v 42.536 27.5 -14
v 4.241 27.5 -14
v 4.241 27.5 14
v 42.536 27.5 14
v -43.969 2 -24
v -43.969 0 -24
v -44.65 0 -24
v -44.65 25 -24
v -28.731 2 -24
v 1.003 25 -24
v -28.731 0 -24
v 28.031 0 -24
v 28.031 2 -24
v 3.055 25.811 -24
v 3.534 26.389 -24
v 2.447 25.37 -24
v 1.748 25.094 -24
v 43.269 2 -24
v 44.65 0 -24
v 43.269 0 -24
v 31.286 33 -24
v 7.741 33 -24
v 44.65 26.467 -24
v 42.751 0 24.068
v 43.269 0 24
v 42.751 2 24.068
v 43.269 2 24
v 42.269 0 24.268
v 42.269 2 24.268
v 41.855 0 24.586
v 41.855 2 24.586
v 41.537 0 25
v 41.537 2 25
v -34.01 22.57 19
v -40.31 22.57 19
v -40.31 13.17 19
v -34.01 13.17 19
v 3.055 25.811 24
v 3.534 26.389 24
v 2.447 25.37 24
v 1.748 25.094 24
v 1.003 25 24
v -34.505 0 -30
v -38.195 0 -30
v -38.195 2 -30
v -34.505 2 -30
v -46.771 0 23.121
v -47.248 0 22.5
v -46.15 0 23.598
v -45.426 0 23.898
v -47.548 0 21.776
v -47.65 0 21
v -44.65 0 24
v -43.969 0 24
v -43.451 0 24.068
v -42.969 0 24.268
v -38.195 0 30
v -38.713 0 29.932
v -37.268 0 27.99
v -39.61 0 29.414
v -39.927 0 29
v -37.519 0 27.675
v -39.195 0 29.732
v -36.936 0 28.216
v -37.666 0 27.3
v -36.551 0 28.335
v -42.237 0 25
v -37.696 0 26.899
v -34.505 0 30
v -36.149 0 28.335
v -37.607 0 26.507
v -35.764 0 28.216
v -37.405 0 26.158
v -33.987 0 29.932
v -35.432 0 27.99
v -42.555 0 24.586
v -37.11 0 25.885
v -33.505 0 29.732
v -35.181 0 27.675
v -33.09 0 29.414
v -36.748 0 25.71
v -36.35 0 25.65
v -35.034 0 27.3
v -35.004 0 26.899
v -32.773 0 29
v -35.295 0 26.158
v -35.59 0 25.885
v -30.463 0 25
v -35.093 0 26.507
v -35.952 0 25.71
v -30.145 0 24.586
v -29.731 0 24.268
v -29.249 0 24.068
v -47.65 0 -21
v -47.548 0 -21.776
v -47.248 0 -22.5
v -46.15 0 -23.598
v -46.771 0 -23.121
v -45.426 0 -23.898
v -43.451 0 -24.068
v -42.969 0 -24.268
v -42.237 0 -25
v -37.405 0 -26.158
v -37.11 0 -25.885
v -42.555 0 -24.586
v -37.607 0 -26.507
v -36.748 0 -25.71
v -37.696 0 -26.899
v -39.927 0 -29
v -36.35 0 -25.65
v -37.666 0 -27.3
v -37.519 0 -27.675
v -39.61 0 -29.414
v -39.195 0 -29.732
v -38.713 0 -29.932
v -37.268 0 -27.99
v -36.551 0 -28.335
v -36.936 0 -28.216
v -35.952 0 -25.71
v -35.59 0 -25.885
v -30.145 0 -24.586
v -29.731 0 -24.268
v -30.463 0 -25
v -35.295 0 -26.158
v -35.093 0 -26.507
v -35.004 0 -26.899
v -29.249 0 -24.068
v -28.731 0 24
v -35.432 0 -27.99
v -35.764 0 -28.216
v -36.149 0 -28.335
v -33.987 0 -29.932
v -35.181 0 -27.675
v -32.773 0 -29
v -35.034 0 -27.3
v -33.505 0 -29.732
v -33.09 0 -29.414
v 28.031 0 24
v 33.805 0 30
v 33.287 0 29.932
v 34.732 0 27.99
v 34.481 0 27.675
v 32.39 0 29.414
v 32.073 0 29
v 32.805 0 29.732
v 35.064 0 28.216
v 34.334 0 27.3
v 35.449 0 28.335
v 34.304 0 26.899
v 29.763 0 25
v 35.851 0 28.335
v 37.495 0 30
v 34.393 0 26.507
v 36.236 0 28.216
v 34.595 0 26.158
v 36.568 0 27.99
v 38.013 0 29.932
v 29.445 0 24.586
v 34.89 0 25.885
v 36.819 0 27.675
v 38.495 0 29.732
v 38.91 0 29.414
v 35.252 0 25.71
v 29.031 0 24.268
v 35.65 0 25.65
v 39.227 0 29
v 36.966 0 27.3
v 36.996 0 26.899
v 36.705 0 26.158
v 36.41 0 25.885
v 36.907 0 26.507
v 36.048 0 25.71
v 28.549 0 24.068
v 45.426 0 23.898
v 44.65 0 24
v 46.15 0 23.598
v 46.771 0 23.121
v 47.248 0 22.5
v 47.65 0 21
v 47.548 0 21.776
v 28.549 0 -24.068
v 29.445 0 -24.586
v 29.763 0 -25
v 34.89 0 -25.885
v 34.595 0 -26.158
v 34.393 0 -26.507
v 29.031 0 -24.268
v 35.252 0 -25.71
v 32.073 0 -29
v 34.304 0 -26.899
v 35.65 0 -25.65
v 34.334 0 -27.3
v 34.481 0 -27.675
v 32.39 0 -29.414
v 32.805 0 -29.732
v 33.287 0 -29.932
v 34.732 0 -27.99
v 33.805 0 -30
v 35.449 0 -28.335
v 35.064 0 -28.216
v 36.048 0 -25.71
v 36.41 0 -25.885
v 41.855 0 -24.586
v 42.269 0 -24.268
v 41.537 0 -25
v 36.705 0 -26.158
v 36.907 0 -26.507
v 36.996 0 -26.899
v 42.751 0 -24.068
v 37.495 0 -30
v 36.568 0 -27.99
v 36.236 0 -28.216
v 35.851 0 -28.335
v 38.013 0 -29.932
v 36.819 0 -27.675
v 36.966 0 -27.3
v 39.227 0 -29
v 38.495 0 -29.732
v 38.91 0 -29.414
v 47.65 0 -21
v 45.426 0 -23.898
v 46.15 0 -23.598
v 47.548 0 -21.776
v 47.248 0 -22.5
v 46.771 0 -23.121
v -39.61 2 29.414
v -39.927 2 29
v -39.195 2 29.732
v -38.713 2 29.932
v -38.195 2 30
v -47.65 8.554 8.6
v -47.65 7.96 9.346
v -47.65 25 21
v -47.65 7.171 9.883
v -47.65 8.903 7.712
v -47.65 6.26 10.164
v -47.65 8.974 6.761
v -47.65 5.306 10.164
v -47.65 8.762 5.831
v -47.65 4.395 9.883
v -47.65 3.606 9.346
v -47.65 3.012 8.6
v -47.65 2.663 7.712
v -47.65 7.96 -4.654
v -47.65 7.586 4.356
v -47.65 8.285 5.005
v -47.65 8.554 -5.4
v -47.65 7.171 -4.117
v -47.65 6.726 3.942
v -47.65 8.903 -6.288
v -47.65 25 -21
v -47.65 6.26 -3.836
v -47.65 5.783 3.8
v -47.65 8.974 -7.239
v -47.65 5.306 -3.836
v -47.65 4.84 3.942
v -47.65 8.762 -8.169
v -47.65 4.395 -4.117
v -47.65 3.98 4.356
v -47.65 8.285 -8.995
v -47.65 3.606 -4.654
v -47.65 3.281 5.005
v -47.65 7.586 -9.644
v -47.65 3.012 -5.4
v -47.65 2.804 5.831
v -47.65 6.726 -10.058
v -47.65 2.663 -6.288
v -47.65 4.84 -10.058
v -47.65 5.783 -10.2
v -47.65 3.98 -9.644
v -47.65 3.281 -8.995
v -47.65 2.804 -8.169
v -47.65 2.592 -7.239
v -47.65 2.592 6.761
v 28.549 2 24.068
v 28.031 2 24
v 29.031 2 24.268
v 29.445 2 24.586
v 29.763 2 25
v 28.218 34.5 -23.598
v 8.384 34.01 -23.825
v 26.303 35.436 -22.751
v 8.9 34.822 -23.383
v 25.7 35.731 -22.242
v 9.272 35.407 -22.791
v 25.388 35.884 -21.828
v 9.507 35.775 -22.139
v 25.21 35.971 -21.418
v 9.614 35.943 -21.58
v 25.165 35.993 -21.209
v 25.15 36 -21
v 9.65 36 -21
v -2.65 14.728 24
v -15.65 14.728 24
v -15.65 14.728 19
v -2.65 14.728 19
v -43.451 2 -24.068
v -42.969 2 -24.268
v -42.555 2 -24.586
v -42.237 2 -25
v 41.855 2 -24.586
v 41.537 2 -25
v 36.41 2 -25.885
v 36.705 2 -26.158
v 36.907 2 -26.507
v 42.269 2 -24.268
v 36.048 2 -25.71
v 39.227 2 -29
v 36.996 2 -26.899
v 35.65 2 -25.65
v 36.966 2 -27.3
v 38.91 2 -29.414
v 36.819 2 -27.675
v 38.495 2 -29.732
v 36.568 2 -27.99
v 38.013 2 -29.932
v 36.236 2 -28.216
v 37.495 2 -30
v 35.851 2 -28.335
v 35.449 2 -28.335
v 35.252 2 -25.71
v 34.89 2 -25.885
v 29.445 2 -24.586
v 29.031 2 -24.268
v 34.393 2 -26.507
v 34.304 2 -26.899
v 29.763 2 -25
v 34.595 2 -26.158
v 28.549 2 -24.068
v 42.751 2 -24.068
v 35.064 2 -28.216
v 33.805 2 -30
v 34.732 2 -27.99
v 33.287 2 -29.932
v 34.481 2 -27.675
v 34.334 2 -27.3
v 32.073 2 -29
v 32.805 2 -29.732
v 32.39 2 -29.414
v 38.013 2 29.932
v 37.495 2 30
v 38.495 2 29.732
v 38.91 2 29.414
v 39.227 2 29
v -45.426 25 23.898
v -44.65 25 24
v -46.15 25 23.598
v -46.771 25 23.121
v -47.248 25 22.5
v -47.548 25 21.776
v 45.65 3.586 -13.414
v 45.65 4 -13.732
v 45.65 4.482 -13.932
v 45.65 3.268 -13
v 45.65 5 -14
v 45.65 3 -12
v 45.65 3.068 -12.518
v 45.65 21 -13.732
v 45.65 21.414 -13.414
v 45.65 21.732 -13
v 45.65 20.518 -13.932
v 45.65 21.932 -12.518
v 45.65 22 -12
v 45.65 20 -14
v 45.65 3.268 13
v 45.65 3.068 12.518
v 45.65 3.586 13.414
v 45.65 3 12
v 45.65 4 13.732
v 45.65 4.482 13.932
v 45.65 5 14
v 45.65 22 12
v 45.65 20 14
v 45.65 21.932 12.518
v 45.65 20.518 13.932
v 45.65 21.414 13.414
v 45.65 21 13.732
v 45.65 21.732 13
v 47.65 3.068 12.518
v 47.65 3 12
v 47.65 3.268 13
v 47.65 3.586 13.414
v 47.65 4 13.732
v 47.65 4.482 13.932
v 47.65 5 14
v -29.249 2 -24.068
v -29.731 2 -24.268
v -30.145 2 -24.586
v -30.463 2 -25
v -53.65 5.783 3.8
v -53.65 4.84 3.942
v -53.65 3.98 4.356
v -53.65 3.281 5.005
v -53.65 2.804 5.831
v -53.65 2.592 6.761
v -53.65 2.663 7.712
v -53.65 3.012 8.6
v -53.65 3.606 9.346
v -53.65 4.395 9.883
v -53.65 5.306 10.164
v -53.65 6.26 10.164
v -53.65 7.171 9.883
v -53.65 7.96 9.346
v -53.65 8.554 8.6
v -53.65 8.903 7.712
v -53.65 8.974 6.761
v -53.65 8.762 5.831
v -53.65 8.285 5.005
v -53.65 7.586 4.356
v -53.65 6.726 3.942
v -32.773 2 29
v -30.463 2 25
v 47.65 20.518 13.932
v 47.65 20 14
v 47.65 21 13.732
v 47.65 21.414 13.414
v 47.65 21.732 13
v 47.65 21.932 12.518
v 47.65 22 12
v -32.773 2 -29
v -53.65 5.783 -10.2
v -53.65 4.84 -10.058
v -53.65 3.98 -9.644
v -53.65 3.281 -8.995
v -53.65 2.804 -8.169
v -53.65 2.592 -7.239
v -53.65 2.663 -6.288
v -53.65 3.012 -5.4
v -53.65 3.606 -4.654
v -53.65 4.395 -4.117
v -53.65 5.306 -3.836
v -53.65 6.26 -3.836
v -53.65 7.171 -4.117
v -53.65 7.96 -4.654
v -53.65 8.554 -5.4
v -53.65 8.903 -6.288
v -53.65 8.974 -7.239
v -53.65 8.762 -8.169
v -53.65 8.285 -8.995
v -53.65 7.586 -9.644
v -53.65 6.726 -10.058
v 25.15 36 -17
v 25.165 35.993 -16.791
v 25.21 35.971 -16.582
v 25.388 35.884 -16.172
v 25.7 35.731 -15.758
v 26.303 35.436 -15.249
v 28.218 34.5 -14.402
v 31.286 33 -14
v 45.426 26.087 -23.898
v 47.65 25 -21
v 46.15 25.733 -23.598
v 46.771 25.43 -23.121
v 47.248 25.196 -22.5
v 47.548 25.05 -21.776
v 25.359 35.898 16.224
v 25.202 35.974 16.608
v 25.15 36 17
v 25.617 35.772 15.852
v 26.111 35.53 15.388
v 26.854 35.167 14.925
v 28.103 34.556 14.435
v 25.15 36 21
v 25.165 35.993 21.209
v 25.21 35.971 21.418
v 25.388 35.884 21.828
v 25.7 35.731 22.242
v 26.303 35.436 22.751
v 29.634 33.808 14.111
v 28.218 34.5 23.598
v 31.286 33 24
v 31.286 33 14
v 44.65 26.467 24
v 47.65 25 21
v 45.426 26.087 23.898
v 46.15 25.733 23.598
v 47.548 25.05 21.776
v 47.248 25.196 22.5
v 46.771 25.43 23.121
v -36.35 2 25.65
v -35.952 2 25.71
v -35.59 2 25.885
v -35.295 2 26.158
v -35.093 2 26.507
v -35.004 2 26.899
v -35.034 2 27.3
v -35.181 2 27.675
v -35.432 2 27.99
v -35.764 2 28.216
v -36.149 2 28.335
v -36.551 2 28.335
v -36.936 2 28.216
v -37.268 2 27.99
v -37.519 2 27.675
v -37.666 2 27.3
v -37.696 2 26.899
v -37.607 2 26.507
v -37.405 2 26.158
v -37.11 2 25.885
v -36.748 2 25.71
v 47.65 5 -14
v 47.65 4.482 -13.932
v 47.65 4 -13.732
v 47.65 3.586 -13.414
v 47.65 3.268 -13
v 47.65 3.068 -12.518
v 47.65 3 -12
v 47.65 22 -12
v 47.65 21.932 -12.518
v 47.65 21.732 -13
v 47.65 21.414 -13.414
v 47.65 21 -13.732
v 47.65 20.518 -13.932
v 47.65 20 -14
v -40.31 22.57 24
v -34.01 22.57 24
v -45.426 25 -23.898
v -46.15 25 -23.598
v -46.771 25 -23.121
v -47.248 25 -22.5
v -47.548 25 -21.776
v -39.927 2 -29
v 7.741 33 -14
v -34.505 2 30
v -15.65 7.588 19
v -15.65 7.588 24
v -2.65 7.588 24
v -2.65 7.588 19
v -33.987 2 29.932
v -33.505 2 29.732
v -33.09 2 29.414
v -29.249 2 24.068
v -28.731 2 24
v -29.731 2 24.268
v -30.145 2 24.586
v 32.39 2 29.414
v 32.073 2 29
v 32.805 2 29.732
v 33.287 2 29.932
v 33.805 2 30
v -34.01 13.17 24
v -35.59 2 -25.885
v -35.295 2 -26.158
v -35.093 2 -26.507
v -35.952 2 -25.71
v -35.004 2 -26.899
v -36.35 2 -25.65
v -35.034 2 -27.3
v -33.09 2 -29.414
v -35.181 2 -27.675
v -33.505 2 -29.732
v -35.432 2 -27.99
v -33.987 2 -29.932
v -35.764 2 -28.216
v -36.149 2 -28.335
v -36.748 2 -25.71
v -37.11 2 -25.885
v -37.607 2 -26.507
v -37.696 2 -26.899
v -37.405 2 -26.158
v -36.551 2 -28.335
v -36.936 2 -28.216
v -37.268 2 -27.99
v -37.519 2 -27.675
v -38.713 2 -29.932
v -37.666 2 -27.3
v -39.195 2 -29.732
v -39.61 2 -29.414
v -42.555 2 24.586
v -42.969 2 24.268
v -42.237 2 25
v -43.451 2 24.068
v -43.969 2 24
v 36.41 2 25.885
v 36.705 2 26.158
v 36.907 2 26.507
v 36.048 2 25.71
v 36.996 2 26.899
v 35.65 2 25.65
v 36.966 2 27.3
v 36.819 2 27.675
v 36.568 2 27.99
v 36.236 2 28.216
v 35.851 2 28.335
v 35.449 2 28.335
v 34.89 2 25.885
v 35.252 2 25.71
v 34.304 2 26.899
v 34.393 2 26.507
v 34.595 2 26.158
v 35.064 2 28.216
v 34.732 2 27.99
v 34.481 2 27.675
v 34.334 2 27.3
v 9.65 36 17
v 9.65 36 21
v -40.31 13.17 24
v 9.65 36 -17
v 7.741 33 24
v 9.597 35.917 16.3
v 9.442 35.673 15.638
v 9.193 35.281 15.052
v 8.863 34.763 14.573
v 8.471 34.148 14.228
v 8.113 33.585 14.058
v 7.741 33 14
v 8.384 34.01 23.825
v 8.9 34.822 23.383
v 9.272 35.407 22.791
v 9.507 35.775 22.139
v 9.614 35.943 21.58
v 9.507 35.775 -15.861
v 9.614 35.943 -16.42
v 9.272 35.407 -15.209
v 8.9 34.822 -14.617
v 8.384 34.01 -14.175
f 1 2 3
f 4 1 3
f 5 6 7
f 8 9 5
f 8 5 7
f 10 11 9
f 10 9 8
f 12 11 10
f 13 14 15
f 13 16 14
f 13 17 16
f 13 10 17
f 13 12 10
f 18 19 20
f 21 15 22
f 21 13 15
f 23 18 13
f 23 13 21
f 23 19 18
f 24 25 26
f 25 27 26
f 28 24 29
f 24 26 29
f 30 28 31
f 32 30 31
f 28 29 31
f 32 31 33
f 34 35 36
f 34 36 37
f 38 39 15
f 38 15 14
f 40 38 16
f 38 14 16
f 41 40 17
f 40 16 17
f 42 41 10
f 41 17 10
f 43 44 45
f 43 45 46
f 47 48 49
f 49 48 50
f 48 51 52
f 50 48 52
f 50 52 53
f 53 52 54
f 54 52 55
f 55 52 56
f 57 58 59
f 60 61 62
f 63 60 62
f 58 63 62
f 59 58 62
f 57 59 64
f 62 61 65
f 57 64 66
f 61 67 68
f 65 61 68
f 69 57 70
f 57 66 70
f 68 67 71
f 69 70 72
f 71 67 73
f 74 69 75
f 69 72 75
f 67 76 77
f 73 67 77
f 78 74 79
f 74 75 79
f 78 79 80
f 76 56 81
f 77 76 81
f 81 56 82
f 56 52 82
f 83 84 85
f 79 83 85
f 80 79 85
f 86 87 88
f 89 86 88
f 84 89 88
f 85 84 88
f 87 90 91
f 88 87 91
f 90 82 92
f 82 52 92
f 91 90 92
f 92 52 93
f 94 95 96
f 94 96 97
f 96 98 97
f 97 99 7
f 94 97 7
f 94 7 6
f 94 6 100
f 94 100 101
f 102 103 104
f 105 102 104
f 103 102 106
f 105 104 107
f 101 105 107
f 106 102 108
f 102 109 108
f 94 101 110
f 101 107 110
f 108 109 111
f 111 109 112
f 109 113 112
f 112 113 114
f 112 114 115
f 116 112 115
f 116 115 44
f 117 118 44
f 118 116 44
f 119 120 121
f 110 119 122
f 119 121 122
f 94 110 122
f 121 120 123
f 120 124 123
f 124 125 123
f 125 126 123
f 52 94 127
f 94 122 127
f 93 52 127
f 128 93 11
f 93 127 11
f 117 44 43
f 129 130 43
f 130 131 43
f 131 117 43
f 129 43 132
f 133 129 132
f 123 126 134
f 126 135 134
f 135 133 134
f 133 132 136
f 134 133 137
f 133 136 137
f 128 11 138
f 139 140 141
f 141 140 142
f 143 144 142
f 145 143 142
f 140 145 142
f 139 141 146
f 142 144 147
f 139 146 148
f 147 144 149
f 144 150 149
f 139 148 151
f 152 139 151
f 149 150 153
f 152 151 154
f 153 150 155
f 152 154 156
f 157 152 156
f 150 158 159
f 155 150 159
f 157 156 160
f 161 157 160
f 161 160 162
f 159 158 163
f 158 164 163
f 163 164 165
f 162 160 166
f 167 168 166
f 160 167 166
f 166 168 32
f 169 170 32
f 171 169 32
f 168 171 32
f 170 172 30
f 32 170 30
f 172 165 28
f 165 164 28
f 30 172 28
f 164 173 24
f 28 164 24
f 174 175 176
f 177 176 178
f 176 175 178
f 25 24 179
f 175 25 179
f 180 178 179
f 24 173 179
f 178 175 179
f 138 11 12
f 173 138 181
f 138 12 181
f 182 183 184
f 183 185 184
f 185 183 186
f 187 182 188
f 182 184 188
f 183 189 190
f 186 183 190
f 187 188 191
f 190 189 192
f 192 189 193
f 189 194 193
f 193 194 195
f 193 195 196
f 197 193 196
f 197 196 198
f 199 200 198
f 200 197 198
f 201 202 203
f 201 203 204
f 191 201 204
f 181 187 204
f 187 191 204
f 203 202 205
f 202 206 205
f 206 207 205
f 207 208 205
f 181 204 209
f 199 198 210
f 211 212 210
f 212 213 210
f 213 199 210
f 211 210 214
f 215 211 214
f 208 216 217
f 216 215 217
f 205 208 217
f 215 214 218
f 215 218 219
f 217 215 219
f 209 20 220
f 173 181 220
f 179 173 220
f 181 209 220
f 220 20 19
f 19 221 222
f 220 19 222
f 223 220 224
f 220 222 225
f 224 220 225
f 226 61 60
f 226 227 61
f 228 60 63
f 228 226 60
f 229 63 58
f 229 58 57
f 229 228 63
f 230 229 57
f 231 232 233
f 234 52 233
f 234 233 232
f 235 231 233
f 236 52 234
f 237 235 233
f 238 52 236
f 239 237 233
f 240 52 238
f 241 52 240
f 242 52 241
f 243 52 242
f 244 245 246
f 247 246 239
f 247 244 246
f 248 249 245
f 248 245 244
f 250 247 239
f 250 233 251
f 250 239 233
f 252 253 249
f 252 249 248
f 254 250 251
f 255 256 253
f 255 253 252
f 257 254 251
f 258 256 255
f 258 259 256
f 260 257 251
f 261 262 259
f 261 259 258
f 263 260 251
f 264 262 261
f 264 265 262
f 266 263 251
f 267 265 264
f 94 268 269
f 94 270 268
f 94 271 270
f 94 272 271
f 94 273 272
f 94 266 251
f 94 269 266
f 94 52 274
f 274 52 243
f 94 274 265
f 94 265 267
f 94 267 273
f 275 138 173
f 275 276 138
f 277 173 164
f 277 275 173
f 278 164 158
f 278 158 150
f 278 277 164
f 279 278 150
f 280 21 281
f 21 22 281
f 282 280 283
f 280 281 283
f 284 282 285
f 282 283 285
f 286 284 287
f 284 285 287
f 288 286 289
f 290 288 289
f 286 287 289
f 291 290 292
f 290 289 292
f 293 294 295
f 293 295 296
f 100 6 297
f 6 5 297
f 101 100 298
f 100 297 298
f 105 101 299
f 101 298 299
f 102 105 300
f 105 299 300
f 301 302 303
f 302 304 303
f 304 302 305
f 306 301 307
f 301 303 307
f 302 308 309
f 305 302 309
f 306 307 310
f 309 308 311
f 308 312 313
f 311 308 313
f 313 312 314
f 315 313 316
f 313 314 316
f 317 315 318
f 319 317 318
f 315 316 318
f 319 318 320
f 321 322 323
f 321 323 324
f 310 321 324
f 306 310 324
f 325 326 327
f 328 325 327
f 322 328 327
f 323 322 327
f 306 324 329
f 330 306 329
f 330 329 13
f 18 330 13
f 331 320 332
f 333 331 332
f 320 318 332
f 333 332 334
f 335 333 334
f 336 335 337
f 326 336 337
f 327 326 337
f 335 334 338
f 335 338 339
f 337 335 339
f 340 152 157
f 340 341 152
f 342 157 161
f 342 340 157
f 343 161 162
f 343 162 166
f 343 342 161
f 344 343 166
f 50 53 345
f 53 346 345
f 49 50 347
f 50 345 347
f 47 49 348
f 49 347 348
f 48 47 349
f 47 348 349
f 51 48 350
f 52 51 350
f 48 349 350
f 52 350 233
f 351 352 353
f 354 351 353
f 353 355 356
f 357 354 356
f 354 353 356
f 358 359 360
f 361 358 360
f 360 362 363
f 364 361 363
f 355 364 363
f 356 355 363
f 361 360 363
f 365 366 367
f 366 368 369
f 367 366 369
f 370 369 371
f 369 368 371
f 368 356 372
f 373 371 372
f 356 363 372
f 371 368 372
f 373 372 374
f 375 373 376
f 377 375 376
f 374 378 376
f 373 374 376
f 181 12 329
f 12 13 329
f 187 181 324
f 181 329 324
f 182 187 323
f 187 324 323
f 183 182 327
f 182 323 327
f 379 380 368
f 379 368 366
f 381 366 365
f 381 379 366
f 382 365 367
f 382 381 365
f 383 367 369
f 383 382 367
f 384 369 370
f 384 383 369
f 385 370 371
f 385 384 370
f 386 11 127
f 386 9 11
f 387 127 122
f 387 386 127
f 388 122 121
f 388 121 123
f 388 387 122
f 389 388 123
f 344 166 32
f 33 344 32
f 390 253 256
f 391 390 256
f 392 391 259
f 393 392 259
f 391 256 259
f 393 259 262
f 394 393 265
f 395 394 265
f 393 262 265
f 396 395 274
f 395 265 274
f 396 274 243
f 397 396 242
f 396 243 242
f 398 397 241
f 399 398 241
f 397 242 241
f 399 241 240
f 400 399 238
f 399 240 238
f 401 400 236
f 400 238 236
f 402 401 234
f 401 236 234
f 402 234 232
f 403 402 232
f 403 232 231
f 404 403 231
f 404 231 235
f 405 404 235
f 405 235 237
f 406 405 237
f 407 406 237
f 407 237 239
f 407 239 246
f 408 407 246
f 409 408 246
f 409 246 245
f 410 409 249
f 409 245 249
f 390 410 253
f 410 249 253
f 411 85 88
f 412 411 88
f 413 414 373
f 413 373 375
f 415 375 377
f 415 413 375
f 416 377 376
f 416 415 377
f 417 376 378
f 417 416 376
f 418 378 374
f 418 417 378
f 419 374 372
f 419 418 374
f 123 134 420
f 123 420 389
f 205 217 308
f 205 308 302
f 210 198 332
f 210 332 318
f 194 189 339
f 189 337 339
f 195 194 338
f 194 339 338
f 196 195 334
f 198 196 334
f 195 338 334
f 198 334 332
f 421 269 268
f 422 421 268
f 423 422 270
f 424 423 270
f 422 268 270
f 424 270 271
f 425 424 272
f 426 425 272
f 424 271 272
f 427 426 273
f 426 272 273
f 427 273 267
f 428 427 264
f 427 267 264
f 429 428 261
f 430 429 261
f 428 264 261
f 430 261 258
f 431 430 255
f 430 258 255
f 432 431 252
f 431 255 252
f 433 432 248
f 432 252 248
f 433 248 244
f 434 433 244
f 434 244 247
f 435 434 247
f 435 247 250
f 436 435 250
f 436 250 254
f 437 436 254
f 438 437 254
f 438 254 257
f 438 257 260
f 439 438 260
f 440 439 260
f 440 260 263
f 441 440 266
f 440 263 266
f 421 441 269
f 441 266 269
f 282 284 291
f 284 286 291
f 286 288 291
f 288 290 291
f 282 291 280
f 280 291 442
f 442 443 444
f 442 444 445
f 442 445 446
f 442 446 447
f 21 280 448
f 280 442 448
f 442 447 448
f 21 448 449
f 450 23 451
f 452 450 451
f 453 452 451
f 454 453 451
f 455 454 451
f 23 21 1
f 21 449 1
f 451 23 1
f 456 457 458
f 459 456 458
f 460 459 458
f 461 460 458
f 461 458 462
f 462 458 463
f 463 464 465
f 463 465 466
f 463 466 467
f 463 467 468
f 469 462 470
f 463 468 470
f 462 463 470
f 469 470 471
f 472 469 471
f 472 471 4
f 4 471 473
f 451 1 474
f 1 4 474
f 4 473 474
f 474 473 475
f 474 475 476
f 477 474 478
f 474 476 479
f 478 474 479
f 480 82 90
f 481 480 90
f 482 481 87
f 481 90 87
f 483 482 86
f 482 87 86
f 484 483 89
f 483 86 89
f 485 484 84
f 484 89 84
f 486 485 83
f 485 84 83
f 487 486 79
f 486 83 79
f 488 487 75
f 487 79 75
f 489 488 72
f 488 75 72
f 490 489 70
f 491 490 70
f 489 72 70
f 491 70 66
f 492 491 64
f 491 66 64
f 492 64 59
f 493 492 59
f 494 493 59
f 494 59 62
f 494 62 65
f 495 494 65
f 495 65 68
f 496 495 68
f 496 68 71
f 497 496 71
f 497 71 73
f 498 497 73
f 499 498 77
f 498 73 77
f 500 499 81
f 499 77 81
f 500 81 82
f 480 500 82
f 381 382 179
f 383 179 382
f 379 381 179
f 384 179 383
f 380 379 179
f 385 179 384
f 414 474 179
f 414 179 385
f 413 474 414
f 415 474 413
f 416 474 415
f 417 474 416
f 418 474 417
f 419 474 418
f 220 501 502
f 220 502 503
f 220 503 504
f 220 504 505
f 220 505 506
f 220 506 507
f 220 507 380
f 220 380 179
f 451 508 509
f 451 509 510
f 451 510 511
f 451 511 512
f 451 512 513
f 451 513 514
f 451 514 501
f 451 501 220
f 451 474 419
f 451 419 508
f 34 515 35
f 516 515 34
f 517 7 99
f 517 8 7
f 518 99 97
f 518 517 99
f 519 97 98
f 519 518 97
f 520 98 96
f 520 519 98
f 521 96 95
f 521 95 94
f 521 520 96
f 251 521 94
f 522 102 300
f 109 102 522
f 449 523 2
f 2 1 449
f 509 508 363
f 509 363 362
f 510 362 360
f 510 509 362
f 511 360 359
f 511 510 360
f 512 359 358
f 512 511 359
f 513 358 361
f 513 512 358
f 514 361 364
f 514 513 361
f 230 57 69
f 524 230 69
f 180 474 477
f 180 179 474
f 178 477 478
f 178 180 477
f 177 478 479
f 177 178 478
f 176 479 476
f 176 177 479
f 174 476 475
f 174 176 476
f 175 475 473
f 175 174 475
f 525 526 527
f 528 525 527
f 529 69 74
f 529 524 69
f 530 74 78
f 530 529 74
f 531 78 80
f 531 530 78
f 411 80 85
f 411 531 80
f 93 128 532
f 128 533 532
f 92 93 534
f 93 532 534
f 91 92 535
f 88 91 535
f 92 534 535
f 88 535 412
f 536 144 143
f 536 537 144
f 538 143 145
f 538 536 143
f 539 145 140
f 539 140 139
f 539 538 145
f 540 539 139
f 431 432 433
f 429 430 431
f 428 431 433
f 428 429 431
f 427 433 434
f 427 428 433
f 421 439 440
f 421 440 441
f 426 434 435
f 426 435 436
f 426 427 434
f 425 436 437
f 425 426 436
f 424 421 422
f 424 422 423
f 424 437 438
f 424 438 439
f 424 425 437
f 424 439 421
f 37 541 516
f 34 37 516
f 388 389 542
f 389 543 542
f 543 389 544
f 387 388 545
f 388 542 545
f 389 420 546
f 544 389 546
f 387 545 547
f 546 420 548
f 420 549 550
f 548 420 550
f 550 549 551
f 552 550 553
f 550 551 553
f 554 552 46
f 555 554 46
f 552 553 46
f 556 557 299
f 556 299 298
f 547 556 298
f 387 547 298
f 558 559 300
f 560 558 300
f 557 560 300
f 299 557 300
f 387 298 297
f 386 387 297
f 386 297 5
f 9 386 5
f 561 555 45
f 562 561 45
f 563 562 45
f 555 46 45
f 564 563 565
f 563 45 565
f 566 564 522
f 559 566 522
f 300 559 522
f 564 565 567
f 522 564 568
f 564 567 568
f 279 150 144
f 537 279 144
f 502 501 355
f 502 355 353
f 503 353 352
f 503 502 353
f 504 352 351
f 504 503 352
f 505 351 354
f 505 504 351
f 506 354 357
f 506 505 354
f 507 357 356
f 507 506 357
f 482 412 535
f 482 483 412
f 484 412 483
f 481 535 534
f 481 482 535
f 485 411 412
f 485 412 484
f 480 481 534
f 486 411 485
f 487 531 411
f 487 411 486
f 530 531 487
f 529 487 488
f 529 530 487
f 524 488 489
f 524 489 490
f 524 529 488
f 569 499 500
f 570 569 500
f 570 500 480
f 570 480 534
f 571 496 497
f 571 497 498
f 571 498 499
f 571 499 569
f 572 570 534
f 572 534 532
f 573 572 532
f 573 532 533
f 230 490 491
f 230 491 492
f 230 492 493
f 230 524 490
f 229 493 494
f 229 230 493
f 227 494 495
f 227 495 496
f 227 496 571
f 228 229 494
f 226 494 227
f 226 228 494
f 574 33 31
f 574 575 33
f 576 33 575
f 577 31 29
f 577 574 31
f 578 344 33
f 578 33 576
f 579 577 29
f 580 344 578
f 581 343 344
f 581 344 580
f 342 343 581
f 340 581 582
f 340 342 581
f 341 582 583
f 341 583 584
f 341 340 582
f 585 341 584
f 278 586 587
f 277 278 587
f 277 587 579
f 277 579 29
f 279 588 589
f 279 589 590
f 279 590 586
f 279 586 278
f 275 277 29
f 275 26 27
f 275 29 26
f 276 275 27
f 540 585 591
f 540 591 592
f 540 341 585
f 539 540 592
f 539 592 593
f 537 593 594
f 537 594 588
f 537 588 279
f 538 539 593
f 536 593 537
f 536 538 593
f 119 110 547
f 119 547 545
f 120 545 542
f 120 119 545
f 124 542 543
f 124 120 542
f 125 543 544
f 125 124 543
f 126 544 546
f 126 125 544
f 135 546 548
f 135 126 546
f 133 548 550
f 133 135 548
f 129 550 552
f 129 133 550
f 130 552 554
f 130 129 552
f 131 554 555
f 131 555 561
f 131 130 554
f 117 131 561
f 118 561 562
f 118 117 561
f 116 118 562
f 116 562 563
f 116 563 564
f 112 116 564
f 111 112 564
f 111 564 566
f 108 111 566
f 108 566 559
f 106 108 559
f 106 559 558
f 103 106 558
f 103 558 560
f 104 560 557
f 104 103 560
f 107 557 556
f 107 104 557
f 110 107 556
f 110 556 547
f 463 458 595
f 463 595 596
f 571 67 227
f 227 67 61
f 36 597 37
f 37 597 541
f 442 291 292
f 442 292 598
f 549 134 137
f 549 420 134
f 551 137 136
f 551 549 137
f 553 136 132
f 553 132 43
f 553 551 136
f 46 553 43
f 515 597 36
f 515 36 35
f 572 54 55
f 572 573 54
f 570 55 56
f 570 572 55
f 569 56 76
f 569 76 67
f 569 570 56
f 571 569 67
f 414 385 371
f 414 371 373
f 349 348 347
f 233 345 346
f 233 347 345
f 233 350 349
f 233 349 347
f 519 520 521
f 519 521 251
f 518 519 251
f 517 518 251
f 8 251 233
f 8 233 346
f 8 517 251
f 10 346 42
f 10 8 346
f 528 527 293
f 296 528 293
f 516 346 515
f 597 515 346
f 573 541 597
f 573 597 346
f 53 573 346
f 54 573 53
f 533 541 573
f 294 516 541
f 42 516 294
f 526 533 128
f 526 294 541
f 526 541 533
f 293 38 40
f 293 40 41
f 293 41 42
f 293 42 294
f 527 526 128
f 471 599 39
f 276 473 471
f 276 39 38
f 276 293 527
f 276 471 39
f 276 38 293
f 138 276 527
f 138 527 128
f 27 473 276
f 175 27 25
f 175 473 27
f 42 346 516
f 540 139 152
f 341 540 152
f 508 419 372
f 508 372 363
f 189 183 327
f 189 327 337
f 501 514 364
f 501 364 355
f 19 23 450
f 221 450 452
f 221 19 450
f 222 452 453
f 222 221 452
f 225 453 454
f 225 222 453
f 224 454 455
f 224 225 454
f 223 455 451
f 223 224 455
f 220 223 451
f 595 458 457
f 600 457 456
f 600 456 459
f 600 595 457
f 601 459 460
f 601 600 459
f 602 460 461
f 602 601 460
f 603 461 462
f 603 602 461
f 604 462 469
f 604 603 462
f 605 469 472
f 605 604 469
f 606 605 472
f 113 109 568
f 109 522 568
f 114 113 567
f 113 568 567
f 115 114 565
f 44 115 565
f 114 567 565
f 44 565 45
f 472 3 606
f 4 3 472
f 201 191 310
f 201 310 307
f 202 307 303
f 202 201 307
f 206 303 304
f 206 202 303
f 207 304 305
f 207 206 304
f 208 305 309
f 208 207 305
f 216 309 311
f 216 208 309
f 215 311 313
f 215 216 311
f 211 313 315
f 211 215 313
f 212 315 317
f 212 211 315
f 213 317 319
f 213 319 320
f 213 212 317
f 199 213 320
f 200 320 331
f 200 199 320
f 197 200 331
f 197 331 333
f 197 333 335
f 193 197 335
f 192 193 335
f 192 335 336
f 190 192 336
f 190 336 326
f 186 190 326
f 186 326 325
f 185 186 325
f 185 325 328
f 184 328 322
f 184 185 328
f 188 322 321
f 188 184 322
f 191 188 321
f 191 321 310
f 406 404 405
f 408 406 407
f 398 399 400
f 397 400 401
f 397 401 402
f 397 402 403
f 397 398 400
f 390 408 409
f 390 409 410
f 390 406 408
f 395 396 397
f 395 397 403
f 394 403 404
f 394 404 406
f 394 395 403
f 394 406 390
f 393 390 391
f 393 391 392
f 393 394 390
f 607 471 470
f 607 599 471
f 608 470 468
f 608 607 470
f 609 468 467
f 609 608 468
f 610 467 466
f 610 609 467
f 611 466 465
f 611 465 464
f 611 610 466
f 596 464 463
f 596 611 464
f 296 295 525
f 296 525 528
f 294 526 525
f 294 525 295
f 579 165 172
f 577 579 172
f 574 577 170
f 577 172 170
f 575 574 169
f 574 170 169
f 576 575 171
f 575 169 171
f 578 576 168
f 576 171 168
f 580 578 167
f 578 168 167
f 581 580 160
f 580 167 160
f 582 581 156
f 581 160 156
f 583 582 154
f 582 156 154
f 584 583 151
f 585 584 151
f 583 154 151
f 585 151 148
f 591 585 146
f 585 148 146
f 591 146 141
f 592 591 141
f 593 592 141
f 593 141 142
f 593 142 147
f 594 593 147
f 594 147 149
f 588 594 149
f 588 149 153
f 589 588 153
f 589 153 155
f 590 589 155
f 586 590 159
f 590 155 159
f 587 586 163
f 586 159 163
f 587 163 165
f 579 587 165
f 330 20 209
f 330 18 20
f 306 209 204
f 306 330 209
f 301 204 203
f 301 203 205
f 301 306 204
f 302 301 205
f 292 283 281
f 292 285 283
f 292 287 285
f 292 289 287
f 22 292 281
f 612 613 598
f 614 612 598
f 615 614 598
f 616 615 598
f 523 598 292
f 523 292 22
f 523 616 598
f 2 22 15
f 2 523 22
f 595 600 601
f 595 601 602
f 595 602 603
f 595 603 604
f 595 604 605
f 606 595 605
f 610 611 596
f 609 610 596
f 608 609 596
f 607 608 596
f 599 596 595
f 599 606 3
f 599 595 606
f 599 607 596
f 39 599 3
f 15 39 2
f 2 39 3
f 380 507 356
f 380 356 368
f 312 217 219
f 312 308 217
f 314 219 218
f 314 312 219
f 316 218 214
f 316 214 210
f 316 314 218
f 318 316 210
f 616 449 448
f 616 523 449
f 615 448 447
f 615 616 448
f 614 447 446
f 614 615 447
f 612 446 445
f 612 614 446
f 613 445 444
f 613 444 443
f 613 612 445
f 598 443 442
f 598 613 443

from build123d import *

# Parameters (mm, degrees)
SKETCH_1_W          = 95.3
SKETCH_1_H          = 48
EXTRUDE_1_DEPTH     = 25
EXTRUDE_2_DEPTH     = 45
CUT_EXTRUDE_1_DEPTH = 77.619335027
CUT_EXTRUDE_2_DEPTH = 2
SKETCH_5_R          = 1.35
EXTRUDE_3_DEPTH     = 2
FILLET_1_R          = 2
FILLET_2_R          = 3
SKETCH_6_R          = 3.2
EXTRUDE_4_DEPTH     = 6
SKETCH_7_W          = 13
SKETCH_7_H          = 7.14
SKETCH_7_W_2        = 6.3
SKETCH_7_H_2        = 9.4
CUT_EXTRUDE_3_DEPTH = 5


with BuildPart() as part:
    # 草图1 → 凸台-拉伸1 (new body)
    with BuildSketch(Plane(origin=(0, 0, 0), x_dir=(1, 0, 0), z_dir=(0, 1, 0))):
        Rectangle(SKETCH_1_W, SKETCH_1_H)
    extrude(amount=EXTRUDE_1_DEPTH)

    # 草图2 → 凸台-拉伸2 (add)
    with BuildSketch(Plane(origin=(47.65, 0, 0), x_dir=(0, 0, -1), z_dir=(1, 0, 0))):
        Polygon((-24, 25), (24, 25), (24, 36), (14, 36), (14, 27.5), (-14, 27.5), (-14, 36), (-24, 36), align=None)
    extrude(amount=-EXTRUDE_2_DEPTH)

    # 草图3 → 切除-拉伸1 (cut, through all)
    with BuildSketch(Plane.XY.offset(24)):
        Polygon((2.65, 25), (2.65, 36), (9.65, 36), align=None)
        Polygon((47.65, 25), (47.65, 36), (25.15, 36), align=None)
    extrude(amount=-CUT_EXTRUDE_1_DEPTH, mode=Mode.SUBTRACT)

    # 草图4 → 切除-拉伸2 (cut)
    with BuildSketch(Plane(origin=(47.65, 0, 0), x_dir=(0, 0, -1), z_dir=(1, 0, 0))):
        with BuildLine():
            Line((-12, 22), (12, 22))
            ThreePointArc((12, 22), (13.414213562, 21.414213562), (14, 20))
            Line((14, 20), (14, 5))
            ThreePointArc((14, 5), (13.414213562, 3.585786438), (12, 3))
            Line((12, 3), (-12, 3))
            ThreePointArc((-12, 3), (-13.414213562, 3.585786438), (-14, 5))
            Line((-14, 5), (-14, 20))
            ThreePointArc((-14, 20), (-13.414213562, 21.414213562), (-12, 22))
        make_face()
    extrude(amount=-CUT_EXTRUDE_2_DEPTH, mode=Mode.SUBTRACT)

    # 草图5 → 凸台-拉伸3 (add)
    # profile 1 of 2: a face of its own
    with BuildSketch(Plane.XZ):
        Polygon((29.185898385, 24), (32.65, 30), (38.65, 30), (42.114101615, 24), align=None)
        with Locations(Location((35.65, 27, 0), (0, 0, 270))):
            Circle(SKETCH_5_R, mode=Mode.SUBTRACT)
    # profile 2 of 2: a face of its own
    with BuildSketch(Plane.XZ):
        Polygon((-42.814101615, 24), (-39.35, 30), (-33.35, 30), (-29.885898385, 24), align=None)
        with Locations(Location((-36.35, 27, 0), (0, 0, 270))):
            Circle(SKETCH_5_R, mode=Mode.SUBTRACT)
    extrude_3 = extrude(amount=-EXTRUDE_3_DEPTH)

    # 镜向1: 凸台-拉伸3 across plane
    add(extrude_3.mirror(Plane.XY))

    # 圆角1
    fillet_1_edges = [part.edges().sort_by_distance(p)[0] for p in [
        (-29.885898385, 1, 24),
        (-42.814101615, 1, 24),
        (-39.35, 1, 30),
        (-33.35, 1, 30),
        (29.185898385, 1, -24),
        (42.114101615, 1, -24),
        (38.65, 1, -30),
        (32.65, 1, -30),
        (-42.814101615, 1, -24),
        (-29.885898385, 1, -24),
        (-33.35, 1, -30),
        (-39.35, 1, -30),
        (42.114101615, 1, 24),
        (29.185898385, 1, 24),
        (32.65, 1, 30),
        (38.65, 1, 30),
    ]]
    fillet(fillet_1_edges, radius=FILLET_1_R)

    # 圆角2
    fillet_2_edges = [part.edges().sort_by_distance(p)[0] for p in [
        (2.65, 25, 0),
        (17.4, 36, -24),
        (17.4, 36, -14),
        (17.4, 36, 14),
        (17.4, 36, 24),
        (47.65, 12.5, 24),
        (47.65, 12.5, -24),
        (-47.65, 12.5, 24),
        (-47.65, 12.5, -24),
    ]]
    fillet(fillet_2_edges, radius=FILLET_2_R)

    # 草图6 → 凸台-拉伸4 (add)
    with BuildSketch(Plane.ZY.offset(47.65)):
        with Locations(Location((-7, 5.783019787, 0), (0, 0, 180))):
            Circle(SKETCH_6_R)
        with Locations(Location((7, 5.783019787, 0), (0, 0, 180))):
            Circle(SKETCH_6_R)
    extrude(amount=EXTRUDE_4_DEPTH)

    # 草图7 → 切除-拉伸3 (cut)
    with BuildSketch(Plane.XY.offset(24)):
        with Locations((-9.15, 11.158)):
            Rectangle(SKETCH_7_W, SKETCH_7_H)
        with Locations((-37.16, 17.87)):
            Rectangle(SKETCH_7_W_2, SKETCH_7_H_2)
    extrude(amount=-CUT_EXTRUDE_3_DEPTH, mode=Mode.SUBTRACT)


solid = part.part
